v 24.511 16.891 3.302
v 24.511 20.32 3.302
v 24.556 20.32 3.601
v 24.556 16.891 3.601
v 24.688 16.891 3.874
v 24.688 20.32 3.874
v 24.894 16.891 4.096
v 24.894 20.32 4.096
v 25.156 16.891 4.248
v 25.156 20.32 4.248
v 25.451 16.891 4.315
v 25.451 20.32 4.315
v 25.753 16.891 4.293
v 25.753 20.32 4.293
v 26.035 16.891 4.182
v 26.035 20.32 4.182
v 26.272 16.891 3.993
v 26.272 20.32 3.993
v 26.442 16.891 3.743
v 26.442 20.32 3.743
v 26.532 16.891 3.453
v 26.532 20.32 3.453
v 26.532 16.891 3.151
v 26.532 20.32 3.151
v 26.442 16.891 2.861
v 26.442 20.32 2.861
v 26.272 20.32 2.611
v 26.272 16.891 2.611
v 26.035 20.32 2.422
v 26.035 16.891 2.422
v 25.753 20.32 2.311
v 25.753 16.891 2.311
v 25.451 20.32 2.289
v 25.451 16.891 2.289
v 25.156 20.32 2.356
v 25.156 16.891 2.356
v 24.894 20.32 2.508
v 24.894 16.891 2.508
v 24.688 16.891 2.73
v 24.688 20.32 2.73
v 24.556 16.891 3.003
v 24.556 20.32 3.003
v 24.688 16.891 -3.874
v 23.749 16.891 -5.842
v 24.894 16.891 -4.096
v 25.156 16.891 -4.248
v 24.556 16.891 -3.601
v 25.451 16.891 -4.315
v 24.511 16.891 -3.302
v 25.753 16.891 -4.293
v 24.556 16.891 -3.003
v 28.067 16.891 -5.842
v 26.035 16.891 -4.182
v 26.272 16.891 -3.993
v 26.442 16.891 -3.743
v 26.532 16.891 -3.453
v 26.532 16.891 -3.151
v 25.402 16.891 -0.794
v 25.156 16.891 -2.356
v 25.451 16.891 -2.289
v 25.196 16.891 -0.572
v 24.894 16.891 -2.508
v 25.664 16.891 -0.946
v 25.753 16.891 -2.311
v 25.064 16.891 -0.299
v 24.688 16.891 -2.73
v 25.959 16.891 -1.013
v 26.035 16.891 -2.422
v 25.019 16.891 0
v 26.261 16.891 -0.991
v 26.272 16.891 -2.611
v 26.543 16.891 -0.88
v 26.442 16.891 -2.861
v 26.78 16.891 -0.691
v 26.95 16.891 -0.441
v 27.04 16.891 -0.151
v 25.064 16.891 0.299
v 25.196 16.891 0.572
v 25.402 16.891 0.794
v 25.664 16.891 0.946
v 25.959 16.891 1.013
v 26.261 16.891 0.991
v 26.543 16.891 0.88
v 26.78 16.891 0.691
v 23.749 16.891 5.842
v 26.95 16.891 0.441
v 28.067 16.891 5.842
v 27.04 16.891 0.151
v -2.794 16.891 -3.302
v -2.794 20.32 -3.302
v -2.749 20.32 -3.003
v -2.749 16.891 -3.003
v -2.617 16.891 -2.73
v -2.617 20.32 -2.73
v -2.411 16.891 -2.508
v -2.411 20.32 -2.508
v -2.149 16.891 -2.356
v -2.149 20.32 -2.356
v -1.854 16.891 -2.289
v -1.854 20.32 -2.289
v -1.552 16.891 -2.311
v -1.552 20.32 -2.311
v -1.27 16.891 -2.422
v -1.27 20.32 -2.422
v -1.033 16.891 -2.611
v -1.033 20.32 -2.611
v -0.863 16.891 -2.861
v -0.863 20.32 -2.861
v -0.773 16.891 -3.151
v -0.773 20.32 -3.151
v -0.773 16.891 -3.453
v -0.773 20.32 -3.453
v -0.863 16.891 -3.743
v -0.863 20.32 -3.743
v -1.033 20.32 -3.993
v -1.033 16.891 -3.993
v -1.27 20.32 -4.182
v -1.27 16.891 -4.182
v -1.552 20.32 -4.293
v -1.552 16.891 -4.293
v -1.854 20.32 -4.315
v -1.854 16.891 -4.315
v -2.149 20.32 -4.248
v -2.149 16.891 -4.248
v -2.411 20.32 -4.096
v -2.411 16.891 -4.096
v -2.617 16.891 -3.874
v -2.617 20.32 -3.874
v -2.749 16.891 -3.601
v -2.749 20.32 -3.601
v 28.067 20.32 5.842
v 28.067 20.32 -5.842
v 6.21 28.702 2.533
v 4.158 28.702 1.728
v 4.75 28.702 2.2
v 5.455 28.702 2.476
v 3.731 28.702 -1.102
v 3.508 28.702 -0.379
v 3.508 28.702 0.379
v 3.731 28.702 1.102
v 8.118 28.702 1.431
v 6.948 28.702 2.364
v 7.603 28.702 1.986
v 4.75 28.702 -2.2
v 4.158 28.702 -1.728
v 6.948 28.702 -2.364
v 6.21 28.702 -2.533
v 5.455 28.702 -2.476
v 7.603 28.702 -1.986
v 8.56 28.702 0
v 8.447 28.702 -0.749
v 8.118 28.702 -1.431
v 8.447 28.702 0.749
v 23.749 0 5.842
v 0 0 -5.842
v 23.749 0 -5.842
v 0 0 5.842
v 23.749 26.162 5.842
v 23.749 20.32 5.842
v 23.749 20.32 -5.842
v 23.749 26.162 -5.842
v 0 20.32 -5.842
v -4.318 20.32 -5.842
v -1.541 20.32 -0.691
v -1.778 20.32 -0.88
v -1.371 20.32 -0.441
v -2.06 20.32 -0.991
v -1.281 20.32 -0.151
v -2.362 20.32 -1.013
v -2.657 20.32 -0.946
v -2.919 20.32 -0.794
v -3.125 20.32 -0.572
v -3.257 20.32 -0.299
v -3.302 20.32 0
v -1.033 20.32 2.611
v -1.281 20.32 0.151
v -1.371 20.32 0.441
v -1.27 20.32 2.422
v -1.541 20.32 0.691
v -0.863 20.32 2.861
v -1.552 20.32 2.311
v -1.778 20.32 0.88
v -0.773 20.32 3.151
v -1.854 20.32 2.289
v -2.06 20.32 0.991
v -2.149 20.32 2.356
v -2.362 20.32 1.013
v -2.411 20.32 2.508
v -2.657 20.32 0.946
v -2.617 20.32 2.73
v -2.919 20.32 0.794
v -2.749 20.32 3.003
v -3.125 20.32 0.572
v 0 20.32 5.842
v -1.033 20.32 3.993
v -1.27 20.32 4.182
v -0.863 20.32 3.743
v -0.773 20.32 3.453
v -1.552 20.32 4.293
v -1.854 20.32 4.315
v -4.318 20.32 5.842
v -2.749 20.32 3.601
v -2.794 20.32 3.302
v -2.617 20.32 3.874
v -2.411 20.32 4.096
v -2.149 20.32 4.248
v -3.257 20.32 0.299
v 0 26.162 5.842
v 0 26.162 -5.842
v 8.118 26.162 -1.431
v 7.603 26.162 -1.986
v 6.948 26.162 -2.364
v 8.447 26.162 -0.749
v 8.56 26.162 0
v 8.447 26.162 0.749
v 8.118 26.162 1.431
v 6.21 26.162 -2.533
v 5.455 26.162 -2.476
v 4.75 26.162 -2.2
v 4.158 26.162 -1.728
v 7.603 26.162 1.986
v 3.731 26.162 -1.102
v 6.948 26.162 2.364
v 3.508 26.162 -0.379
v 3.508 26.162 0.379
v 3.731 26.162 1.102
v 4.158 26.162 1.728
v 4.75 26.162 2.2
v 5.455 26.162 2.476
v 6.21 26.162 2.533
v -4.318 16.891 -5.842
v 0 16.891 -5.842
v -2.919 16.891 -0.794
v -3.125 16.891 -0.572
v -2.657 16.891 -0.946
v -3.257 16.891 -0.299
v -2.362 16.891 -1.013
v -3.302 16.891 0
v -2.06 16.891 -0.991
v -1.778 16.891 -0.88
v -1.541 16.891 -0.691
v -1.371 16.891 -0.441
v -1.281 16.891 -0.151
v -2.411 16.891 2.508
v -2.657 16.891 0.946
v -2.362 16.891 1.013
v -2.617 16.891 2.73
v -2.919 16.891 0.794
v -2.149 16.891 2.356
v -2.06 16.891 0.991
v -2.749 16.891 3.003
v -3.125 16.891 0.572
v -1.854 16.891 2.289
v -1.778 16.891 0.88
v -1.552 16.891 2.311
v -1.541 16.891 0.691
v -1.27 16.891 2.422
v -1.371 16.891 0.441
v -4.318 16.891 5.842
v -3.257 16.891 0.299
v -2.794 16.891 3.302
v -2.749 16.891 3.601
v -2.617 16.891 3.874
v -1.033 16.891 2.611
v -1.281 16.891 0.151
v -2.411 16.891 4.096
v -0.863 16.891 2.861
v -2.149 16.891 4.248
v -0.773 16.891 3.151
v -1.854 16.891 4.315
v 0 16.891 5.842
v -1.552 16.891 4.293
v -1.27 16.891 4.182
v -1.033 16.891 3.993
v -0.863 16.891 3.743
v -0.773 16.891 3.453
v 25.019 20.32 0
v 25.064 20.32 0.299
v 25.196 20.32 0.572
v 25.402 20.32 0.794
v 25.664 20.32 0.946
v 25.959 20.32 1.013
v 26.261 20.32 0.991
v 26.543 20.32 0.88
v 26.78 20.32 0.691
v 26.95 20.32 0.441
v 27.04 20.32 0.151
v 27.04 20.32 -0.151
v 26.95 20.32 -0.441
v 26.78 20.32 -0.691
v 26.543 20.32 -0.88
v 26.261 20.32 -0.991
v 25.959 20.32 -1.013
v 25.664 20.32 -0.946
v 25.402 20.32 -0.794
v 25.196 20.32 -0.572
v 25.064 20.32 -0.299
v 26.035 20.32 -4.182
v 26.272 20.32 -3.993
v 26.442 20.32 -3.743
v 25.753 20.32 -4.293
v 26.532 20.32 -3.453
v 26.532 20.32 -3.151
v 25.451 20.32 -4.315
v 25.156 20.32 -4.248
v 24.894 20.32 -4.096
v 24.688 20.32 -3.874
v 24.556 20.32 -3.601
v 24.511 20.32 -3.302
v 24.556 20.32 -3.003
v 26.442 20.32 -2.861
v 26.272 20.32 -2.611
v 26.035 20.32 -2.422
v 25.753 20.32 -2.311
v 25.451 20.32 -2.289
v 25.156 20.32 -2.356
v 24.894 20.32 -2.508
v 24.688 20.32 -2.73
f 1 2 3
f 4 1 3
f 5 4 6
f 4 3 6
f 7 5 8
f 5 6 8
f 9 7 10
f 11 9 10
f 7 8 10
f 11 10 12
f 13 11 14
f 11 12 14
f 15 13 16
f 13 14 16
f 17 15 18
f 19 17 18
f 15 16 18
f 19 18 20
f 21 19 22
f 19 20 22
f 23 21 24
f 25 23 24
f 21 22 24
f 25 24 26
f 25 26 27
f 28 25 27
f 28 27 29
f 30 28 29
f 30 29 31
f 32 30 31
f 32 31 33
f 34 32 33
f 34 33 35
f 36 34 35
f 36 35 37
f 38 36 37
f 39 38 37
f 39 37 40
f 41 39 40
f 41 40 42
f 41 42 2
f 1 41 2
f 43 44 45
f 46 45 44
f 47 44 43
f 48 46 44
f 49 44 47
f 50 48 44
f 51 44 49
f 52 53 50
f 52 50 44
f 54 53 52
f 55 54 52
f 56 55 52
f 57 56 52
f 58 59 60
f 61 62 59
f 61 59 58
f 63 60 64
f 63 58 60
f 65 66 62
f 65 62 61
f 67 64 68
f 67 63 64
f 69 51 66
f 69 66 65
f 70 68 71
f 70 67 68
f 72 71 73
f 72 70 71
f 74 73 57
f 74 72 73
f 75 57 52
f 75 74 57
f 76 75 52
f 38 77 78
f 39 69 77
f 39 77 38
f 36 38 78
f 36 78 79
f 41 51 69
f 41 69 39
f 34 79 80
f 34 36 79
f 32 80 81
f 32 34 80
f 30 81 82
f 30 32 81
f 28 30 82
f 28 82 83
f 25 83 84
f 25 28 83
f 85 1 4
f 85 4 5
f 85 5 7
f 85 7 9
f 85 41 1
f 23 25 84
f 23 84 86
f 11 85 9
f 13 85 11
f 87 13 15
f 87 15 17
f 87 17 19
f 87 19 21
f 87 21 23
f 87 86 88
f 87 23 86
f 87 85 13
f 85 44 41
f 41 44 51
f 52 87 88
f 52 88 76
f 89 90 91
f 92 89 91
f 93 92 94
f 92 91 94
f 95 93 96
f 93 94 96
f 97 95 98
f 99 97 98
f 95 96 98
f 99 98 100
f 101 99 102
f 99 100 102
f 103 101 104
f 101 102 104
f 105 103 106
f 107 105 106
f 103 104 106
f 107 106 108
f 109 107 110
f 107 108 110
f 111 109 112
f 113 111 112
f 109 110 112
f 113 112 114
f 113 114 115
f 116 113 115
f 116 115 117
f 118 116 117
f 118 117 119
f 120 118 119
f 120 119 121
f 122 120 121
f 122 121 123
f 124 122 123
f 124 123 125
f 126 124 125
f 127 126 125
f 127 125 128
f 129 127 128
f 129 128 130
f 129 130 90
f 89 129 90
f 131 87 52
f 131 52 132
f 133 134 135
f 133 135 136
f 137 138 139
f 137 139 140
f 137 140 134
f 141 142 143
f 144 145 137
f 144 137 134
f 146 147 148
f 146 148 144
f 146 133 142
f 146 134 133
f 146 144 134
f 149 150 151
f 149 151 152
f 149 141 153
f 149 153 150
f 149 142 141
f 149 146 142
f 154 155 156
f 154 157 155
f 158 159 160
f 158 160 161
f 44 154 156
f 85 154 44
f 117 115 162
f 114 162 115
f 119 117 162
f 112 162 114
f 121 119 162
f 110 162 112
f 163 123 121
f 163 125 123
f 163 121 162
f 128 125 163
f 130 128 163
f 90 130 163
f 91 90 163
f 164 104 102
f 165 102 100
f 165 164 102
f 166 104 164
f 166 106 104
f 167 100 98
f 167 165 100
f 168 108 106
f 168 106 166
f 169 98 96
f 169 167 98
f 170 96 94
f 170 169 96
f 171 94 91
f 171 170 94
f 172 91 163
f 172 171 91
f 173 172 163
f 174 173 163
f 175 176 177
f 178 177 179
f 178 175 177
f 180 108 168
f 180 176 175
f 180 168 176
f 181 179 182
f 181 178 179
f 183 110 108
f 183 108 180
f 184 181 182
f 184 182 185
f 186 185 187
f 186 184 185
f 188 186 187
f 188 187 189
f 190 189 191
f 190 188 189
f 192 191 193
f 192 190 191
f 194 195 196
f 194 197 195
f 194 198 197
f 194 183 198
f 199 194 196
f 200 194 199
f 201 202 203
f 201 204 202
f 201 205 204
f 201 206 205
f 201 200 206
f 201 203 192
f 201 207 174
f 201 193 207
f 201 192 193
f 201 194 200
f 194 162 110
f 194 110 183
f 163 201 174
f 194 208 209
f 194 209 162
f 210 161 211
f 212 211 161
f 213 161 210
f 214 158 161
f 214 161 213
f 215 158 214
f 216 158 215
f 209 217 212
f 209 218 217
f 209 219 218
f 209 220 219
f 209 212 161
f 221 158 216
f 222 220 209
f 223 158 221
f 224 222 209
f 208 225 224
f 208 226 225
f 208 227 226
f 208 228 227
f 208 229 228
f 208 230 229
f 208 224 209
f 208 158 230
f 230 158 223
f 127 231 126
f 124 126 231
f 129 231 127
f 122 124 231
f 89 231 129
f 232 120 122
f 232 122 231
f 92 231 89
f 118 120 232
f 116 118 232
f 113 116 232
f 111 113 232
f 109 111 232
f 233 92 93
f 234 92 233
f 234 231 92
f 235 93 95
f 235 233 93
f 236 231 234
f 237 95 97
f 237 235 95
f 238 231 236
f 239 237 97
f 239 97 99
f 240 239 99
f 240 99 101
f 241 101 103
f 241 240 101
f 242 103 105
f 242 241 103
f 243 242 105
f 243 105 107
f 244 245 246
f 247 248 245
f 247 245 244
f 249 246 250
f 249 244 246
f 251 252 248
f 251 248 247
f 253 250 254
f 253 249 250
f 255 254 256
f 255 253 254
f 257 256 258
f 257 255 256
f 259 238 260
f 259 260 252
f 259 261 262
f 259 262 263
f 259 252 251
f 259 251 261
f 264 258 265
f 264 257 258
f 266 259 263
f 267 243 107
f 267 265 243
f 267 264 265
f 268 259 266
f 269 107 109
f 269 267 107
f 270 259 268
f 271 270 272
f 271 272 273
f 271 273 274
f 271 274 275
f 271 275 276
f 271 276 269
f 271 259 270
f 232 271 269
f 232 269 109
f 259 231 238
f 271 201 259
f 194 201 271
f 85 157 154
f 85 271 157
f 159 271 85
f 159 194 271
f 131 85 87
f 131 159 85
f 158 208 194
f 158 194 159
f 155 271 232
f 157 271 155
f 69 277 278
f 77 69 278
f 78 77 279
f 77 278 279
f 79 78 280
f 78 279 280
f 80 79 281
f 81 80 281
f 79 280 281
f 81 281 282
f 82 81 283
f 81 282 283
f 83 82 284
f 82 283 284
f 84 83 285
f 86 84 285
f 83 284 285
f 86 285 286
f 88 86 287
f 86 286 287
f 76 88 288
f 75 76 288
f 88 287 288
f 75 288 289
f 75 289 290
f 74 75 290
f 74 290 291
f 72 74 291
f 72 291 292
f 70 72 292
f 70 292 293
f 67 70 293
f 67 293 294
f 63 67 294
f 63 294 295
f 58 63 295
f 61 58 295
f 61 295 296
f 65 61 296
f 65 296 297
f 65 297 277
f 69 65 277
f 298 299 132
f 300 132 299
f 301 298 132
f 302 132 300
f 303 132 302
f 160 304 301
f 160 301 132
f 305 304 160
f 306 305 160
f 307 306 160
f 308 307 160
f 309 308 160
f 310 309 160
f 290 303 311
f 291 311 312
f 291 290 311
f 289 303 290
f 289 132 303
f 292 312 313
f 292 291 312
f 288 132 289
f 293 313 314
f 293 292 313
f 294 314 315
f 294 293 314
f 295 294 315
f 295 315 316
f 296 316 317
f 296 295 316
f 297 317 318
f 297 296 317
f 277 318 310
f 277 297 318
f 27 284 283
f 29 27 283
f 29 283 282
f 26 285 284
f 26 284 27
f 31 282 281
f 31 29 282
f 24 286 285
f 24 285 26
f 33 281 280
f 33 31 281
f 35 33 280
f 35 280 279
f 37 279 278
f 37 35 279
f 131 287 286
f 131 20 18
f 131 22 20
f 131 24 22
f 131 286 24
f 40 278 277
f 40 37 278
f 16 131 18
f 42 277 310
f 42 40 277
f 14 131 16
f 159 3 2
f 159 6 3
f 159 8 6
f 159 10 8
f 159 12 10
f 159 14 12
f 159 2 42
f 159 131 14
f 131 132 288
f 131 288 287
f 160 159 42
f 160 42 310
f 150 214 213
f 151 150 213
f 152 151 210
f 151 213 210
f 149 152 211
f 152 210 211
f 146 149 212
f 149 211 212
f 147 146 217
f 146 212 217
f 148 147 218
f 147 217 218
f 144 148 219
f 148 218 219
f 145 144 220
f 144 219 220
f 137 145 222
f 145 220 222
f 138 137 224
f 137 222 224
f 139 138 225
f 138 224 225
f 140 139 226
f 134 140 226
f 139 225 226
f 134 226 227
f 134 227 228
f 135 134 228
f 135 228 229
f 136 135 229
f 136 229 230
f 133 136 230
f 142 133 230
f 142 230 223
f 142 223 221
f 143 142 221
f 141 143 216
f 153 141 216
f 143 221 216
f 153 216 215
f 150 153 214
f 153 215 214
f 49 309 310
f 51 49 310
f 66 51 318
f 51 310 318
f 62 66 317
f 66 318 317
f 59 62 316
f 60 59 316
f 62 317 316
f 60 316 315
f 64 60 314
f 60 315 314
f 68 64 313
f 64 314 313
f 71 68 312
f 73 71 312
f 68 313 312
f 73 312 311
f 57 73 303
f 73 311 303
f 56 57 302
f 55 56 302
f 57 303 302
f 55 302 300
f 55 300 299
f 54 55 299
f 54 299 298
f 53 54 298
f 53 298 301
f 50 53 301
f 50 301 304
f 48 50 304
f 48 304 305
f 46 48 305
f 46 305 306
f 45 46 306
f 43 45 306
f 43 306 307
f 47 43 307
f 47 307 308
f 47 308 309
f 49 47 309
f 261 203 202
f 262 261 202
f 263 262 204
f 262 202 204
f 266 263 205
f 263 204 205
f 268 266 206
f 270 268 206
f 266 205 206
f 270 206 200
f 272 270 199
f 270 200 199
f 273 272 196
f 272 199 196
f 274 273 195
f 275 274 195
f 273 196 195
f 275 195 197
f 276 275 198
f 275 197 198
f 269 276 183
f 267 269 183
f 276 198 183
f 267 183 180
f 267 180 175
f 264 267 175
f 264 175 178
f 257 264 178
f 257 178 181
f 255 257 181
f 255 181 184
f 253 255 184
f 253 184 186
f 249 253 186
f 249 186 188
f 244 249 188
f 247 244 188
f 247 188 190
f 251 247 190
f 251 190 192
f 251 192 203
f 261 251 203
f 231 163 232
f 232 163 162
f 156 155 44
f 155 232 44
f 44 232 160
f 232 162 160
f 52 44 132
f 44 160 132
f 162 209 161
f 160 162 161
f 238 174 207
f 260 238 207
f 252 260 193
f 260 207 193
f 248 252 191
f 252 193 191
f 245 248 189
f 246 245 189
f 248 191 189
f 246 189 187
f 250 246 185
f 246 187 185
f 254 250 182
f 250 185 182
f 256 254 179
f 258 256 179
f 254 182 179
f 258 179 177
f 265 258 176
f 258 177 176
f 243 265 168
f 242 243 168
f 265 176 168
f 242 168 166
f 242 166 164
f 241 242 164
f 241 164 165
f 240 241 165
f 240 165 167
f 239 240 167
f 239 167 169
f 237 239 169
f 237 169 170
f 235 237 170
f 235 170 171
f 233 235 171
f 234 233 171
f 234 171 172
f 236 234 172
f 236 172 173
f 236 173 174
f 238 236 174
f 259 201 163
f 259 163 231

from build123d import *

# Parameters (mm, degrees)
BOSS_EXTRUDE1_DEPTH = 5.842
SKETCH2_R           = 2.54
BOSS_EXTRUDE2_DEPTH = 2.54
CUT_EXTRUDE1_REACH  = 37.14
SKETCH3_R           = 1.016


with BuildPart() as part:
    # Sketch1 → Boss-Extrude1 (new, symmetric)
    with BuildSketch(Plane.XY):
        Polygon((0, 0), (23.749, 0), (23.749, 16.891), (28.067, 16.891), (28.067, 20.32), (23.749, 20.32), (23.749, 26.162), (0, 26.162), (0, 20.32), (-4.318, 20.32), (-4.318, 16.891), (0, 16.891), align=None)
    extrude(amount=BOSS_EXTRUDE1_DEPTH, both=True)

    # Sketch2 → Boss-Extrude2 (add)
    with BuildSketch(Plane(origin=(0, 26.162, 0), x_dir=(1, 0, 0), z_dir=(0, 1, 0))):
        with Locations((6.0198, 0)):
            Circle(SKETCH2_R)
    extrude(amount=BOSS_EXTRUDE2_DEPTH)

    # Sketch3 → Cut-Extrude1 (cut, up to next)
    with BuildSketch(Plane(origin=(0, 20.32, 0), x_dir=(1, 0, 0), z_dir=(0, 1, 0)), mode=Mode.PRIVATE) as cut_extrude1_sk1:
        with Locations(Location((-2.286, 0, 0), (0, 0, 180))):
            Circle(SKETCH3_R)
    cut_extrude1_tool1 = extrude(cut_extrude1_sk1.sketch, amount=-CUT_EXTRUDE1_REACH, mode=Mode.PRIVATE) & part.part
    # Sketch3 → Cut-Extrude1 (cut, up to next)
    with BuildSketch(Plane(origin=(0, 20.32, 0), x_dir=(1, 0, 0), z_dir=(0, 1, 0)), mode=Mode.PRIVATE) as cut_extrude1_sk2:
        with Locations(Location((-1.778, 3.302, 0), (0, 0, 180))):
            Circle(SKETCH3_R)
    cut_extrude1_tool2 = extrude(cut_extrude1_sk2.sketch, amount=-CUT_EXTRUDE1_REACH, mode=Mode.PRIVATE) & part.part
    # Sketch3 → Cut-Extrude1 (cut, up to next)
    with BuildSketch(Plane(origin=(0, 20.32, 0), x_dir=(1, 0, 0), z_dir=(0, 1, 0)), mode=Mode.PRIVATE) as cut_extrude1_sk3:
        with Locations(Location((-1.778, -3.302, 0), (0, 0, 180))):
            Circle(SKETCH3_R)
    cut_extrude1_tool3 = extrude(cut_extrude1_sk3.sketch, amount=-CUT_EXTRUDE1_REACH, mode=Mode.PRIVATE) & part.part
    # Sketch3 → Cut-Extrude1 (cut, up to next)
    with BuildSketch(Plane(origin=(0, 20.32, 0), x_dir=(1, 0, 0), z_dir=(0, 1, 0)), mode=Mode.PRIVATE) as cut_extrude1_sk4:
        with Locations(Location((25.527, -3.302, 0), (0, 0, 180))):
            Circle(SKETCH3_R)
    cut_extrude1_tool4 = extrude(cut_extrude1_sk4.sketch, amount=-CUT_EXTRUDE1_REACH, mode=Mode.PRIVATE) & part.part
    # Sketch3 → Cut-Extrude1 (cut, up to next)
    with BuildSketch(Plane(origin=(0, 20.32, 0), x_dir=(1, 0, 0), z_dir=(0, 1, 0)), mode=Mode.PRIVATE) as cut_extrude1_sk5:
        with Locations(Location((26.035, 0, 0), (0, 0, 180))):
            Circle(SKETCH3_R)
    cut_extrude1_tool5 = extrude(cut_extrude1_sk5.sketch, amount=-CUT_EXTRUDE1_REACH, mode=Mode.PRIVATE) & part.part
    # Sketch3 → Cut-Extrude1 (cut, up to next)
    with BuildSketch(Plane(origin=(0, 20.32, 0), x_dir=(1, 0, 0), z_dir=(0, 1, 0)), mode=Mode.PRIVATE) as cut_extrude1_sk6:
        with Locations(Location((25.527, 3.302, 0), (0, 0, 180))):
            Circle(SKETCH3_R)
    cut_extrude1_tool6 = extrude(cut_extrude1_sk6.sketch, amount=-CUT_EXTRUDE1_REACH, mode=Mode.PRIVATE) & part.part
    add(cut_extrude1_tool1.solids().sort_by_distance((-2.286, 20.32, 0))[0], mode=Mode.SUBTRACT)
    add(cut_extrude1_tool2.solids().sort_by_distance((-1.778, 20.32, -3.302))[0], mode=Mode.SUBTRACT)
    add(cut_extrude1_tool3.solids().sort_by_distance((-1.778, 20.32, 3.302))[0], mode=Mode.SUBTRACT)
    add(cut_extrude1_tool4.solids().sort_by_distance((25.527, 20.32, 3.302))[0], mode=Mode.SUBTRACT)
    add(cut_extrude1_tool5.solids().sort_by_distance((26.035, 20.32, 0))[0], mode=Mode.SUBTRACT)
    add(cut_extrude1_tool6.solids().sort_by_distance((25.527, 20.32, -3.302))[0], mode=Mode.SUBTRACT)


solid = part.part
